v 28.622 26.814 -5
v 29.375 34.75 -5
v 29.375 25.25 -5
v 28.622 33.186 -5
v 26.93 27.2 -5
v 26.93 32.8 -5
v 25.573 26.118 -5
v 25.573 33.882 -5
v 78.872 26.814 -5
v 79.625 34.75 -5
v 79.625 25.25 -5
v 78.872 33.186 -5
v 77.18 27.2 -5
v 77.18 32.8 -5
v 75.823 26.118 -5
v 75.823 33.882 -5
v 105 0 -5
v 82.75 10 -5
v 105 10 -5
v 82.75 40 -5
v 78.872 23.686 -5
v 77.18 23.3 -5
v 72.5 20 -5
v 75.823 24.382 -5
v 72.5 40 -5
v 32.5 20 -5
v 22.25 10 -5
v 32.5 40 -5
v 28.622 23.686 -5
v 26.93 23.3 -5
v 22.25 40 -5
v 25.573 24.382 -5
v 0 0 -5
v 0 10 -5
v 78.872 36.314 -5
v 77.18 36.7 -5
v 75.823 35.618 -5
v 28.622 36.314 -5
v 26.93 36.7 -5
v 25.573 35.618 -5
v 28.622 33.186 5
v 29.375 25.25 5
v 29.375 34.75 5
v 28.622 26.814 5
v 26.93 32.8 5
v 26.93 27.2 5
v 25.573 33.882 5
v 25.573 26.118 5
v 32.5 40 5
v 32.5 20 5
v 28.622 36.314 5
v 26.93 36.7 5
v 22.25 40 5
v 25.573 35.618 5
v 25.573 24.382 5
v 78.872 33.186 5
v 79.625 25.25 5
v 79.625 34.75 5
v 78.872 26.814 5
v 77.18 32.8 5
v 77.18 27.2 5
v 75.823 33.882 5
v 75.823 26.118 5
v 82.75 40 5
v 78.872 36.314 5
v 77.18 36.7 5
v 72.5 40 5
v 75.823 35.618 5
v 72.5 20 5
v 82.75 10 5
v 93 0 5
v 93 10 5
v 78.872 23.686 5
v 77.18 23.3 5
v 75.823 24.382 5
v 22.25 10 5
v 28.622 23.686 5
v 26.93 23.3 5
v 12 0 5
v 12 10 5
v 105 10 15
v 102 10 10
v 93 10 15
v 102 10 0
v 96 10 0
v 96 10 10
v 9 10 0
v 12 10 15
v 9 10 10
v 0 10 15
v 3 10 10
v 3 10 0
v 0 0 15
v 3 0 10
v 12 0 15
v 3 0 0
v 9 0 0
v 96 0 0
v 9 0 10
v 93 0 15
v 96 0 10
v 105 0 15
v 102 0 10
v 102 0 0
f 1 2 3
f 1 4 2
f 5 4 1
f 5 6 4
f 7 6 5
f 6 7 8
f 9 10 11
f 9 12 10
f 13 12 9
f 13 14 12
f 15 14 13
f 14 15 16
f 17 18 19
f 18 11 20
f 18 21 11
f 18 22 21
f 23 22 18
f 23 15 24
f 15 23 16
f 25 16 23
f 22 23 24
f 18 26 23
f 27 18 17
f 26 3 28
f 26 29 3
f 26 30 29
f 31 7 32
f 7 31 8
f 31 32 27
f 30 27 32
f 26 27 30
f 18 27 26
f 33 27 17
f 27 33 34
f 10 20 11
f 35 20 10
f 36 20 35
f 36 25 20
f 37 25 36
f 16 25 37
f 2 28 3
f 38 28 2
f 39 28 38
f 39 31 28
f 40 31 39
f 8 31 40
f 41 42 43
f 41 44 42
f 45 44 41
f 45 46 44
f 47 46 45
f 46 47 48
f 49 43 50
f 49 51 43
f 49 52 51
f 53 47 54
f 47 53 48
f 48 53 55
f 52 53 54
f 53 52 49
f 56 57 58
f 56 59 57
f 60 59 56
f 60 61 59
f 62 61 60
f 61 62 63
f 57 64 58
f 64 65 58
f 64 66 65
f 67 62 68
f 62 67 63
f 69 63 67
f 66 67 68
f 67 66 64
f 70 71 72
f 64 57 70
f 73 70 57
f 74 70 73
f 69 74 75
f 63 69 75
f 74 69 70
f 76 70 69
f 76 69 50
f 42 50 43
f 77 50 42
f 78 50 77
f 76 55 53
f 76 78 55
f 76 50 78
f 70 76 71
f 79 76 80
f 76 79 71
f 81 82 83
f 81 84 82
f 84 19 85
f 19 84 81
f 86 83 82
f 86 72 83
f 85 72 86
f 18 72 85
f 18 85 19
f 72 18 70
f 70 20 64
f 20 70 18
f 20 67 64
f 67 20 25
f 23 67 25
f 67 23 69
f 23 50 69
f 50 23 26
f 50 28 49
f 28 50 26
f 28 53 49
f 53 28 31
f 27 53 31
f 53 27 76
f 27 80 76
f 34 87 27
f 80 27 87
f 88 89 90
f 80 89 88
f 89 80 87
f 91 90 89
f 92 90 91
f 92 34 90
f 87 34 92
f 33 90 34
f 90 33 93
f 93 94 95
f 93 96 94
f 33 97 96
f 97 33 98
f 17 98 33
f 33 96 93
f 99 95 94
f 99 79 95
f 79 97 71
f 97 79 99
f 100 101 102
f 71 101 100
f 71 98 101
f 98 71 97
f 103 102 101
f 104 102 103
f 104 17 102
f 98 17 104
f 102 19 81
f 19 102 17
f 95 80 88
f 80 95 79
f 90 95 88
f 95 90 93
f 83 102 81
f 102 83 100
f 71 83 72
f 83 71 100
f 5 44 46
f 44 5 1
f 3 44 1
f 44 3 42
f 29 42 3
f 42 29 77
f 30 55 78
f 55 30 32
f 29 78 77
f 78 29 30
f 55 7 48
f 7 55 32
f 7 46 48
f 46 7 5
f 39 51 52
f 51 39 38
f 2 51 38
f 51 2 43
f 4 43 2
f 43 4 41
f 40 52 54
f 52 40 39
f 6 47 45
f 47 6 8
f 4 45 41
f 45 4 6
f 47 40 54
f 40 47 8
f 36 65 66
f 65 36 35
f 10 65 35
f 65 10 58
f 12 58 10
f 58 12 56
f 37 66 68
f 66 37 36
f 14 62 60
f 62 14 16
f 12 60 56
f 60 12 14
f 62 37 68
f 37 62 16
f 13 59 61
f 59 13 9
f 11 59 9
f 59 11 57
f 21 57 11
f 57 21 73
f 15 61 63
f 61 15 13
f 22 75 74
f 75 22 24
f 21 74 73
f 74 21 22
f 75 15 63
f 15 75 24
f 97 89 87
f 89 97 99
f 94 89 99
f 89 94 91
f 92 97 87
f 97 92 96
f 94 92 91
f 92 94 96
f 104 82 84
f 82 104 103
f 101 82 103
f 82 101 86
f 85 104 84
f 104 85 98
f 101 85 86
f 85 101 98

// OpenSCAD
servowidth = 40;
servoheight = 20;
shdiameter= 4;
distanceholes = 9.5;
shradius= shdiameter/2;


difference(){

union(){
linear_extrude(height = 10, 
    center = true, 
    convexity = 10, 
    twist = 0)
polygon(points= [
    [0,0],
    [0,10],
    [8.75,10],
    [52.5-servowidth/2 -10.25, 10], 
    [52.5-servowidth/2 -10.25,20+ servoheight],
    [52.5-servowidth/2,20+ servoheight],
    [52.5-servowidth/2,20],
    [52.5+servowidth/2,20],
    [52.5+servowidth/2,20+ servoheight],
    [62.75+servowidth/2,20+ servoheight],
    [62.75 + servowidth/2,10], 
    [105,10], 
    [105,0]
    ]); 
    
    //two extrusions on sides
    cube([12,10,15]);
  
  translate([105-12,0,0])
  cube([12,10,15]);  
} 

//Servo screw holes
//bottom origin
translate([52.5-servowidth/2 -5.125, 20- distanceholes/2 + servoheight/2, -5])
cylinder (h=10, r=shradius);
   
//top origin
translate([52.5-servowidth/2 -5.125, 20+ distanceholes/2 + servoheight/2, -5])
cylinder (h=10, r=shradius);

//top
translate([52.5+servowidth/2 +5.125, 20+ distanceholes/2 + servoheight/2, -5])
cylinder (h=10, r=shradius);

//bottom
translate([52.5+servowidth/2 +5.125, 20 - distanceholes/2 + servoheight/2, -5])
cylinder (h=10, r=shradius);


//Wood screw holes
translate([3, 0, 0])
cube ([6,10,10]);

translate([105-6-3, 0, 0])
cube ([6,10,10]);

}
